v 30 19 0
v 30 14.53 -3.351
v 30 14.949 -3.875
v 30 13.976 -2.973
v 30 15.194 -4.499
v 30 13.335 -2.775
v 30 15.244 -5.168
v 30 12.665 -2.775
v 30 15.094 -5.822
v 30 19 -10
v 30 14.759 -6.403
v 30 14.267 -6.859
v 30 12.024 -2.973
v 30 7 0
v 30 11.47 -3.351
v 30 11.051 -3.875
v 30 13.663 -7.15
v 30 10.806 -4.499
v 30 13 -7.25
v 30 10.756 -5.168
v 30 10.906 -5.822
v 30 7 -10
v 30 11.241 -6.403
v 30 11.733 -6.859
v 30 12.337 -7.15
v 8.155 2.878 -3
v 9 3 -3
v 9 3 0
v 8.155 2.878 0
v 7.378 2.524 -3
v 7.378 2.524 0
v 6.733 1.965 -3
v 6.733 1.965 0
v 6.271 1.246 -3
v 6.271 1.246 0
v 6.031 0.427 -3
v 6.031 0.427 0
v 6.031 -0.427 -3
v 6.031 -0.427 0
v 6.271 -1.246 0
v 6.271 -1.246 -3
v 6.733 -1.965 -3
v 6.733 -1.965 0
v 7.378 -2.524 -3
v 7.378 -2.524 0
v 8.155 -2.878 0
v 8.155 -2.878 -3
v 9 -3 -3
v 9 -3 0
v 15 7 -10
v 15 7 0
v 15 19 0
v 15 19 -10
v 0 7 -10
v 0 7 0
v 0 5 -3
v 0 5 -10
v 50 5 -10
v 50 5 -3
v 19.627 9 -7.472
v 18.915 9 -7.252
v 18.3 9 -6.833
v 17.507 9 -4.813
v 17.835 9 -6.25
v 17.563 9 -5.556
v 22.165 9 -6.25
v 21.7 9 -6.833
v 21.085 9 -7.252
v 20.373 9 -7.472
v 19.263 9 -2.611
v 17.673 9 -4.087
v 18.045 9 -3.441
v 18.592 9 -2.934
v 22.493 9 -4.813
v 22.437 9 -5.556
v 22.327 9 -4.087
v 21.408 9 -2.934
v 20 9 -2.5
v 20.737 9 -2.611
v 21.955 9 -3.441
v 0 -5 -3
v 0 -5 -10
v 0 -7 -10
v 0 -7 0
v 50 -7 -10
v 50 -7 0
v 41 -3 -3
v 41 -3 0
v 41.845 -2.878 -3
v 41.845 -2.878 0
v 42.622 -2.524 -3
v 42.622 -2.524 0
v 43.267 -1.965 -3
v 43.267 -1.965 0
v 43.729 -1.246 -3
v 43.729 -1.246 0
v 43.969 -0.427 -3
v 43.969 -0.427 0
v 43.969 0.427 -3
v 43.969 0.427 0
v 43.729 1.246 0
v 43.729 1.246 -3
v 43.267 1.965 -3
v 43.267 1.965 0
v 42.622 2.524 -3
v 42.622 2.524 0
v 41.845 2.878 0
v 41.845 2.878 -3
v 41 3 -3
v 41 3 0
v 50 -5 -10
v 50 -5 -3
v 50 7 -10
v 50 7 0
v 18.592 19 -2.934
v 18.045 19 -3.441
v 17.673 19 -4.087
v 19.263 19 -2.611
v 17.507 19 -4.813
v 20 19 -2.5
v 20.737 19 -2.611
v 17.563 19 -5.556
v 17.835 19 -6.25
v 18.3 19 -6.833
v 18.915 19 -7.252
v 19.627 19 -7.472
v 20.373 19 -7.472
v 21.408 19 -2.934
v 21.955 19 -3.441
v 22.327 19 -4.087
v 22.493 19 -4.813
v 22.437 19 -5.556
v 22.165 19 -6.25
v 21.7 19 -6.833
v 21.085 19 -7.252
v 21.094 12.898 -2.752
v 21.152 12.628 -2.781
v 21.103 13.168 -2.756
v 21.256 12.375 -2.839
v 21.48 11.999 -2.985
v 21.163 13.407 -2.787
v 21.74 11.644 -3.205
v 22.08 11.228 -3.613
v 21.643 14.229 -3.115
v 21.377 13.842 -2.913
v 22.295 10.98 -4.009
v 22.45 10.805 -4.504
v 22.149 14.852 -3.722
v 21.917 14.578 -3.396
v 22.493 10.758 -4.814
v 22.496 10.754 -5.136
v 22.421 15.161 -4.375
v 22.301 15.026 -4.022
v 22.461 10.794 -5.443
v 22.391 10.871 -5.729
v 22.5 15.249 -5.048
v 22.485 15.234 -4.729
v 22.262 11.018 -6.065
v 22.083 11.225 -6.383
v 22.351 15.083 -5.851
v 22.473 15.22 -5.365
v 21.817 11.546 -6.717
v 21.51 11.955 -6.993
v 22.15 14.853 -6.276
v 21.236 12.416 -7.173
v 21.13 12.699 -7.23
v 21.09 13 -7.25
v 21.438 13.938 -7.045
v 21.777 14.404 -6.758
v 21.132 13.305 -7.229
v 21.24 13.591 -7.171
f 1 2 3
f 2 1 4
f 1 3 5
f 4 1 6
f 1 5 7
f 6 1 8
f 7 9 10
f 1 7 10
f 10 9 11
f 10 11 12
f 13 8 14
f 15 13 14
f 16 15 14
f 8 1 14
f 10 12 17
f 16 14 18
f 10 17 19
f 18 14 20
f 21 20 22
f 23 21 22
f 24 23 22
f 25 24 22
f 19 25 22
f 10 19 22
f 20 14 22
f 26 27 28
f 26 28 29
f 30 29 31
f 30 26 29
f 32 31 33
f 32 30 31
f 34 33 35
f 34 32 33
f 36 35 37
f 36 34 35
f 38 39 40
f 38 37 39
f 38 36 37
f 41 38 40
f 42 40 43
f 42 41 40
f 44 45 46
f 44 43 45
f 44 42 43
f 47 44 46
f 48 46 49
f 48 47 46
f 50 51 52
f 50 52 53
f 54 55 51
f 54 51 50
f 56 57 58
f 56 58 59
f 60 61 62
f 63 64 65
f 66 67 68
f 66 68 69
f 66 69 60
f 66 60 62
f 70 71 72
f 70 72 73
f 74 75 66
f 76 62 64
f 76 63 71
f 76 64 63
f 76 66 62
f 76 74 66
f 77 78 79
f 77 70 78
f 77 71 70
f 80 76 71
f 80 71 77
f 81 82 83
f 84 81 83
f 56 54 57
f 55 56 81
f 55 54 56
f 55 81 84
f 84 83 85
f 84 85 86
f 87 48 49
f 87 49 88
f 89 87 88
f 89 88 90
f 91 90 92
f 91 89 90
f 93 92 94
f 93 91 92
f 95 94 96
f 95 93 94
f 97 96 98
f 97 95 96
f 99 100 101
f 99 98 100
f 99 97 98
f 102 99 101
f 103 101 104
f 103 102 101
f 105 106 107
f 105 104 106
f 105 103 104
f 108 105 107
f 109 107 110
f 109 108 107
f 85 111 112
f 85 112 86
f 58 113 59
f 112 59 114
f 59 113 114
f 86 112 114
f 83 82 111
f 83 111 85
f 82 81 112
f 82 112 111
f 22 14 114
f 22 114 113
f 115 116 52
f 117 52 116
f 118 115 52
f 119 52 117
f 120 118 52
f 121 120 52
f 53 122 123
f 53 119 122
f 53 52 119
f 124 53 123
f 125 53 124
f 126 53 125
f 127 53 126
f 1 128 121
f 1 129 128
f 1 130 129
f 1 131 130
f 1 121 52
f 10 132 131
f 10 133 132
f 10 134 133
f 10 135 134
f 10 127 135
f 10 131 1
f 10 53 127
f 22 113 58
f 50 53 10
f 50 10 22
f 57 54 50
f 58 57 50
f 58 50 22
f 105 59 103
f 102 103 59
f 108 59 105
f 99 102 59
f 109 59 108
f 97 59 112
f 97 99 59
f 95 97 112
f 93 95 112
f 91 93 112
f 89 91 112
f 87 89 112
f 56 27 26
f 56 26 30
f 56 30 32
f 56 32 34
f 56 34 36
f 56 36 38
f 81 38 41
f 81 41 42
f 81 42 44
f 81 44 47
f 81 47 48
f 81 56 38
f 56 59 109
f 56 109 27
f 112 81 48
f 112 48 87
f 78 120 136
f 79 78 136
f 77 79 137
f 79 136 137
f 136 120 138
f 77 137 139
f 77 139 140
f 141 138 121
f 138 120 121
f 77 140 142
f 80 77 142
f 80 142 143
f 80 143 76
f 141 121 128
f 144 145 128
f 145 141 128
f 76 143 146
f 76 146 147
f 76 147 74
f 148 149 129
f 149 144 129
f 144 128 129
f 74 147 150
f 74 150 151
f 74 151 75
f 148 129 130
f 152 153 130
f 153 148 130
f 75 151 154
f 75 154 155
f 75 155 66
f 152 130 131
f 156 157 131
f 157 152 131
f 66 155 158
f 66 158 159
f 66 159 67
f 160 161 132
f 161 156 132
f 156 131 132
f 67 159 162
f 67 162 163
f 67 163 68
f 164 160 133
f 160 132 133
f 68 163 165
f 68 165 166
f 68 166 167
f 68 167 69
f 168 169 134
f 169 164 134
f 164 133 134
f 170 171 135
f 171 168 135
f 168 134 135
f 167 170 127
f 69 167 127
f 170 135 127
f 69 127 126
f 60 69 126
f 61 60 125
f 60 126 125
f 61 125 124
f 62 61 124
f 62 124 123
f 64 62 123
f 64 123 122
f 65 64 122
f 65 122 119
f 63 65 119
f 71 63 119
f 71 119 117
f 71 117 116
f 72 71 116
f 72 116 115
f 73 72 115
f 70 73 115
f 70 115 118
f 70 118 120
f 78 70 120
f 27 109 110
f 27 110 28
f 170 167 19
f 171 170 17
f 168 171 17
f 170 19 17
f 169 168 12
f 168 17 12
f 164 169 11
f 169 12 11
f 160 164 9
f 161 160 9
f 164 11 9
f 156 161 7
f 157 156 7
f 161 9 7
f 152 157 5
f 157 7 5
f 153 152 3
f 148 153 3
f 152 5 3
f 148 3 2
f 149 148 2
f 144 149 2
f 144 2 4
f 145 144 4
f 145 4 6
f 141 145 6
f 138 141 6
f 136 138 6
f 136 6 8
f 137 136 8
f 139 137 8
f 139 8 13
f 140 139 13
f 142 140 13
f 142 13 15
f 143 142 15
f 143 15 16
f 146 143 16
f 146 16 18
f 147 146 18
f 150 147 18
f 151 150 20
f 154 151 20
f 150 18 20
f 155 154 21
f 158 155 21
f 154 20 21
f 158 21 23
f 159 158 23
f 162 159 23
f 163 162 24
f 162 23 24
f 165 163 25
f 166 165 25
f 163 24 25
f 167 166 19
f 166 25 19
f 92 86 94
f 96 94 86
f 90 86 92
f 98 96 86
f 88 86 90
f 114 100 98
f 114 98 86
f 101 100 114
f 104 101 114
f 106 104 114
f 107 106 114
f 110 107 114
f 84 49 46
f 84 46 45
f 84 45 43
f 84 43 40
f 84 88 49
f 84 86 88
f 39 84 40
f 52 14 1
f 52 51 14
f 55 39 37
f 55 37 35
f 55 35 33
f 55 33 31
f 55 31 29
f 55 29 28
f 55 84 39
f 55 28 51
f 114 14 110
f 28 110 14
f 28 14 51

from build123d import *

# Parameters (mm, degrees)
BOSS_EXTRUDE1_DEPTH     = 50
CUT_EXTRUDE1_DEPTH      = 51.970579749
SKETCH4_W               = 15
SKETCH4_H               = 10
BOSS_EXTRUDE2_DEPTH     = 12
SKETCH5_R               = 2.5
CUT_EXTRUDE2_DEPTH      = 10
CUT_EXTRUDE3_REACH      = 38.892
CUT_EXTRUDE3_END_RADIUS = 2.5
SKETCH6_R               = 2.25


with BuildPart() as part:
    # Sketch2 → Boss-Extrude1 (new body)
    with BuildSketch(Plane(origin=(0, 0, 0), x_dir=(0, 0, -1), z_dir=(1, 0, 0))):
        Polygon((0, -7), (0, 7), (10, 7), (10, 5), (3, 5), (3, -5), (10, -5), (10, -7), align=None)
    extrude(amount=BOSS_EXTRUDE1_DEPTH)

    # Sketch3 → Cut-Extrude1 (cut, through all)
    with BuildSketch(Plane(origin=(0, 0, -3), x_dir=(-1, 0, 0), z_dir=(0, 0, -1))):
        with BuildLine():
            Line((-41, 3), (-9, 3))
            ThreePointArc((-9, 3), (-6, 0), (-9, -3))
            Line((-9, -3), (-41, -3))
            ThreePointArc((-41, -3), (-44, 0), (-41, 3))
        make_face()
    extrude(amount=-CUT_EXTRUDE1_DEPTH, mode=Mode.SUBTRACT)

    # Sketch4 → Boss-Extrude2 (add)
    with BuildSketch(Plane(origin=(0, 7, 0), x_dir=(1, 0, 0), z_dir=(0, 1, 0))):
        with Locations((22.5, 5)):
            Rectangle(SKETCH4_W, SKETCH4_H)
    extrude(amount=BOSS_EXTRUDE2_DEPTH)

    # Sketch5 → Cut-Extrude2 (cut)
    with BuildSketch(Plane(origin=(0, 19, 0), x_dir=(1, 0, 0), z_dir=(0, 1, 0))):
        with Locations(Location((20, 5, 0), (0, 0, 270))):
            Circle(SKETCH5_R)
    extrude(amount=-CUT_EXTRUDE2_DEPTH, mode=Mode.SUBTRACT)

    # Cut-Extrude3: up to this cylinder (the profile starts outside it)
    cut_extrude3_end = Plane(origin=(20, 13, -5), z_dir=(0, 1, 0)) * Cylinder(CUT_EXTRUDE3_END_RADIUS, 83.784, mode=Mode.PRIVATE)
    # Sketch6 → Cut-Extrude3 (cut, up to the surface)
    with BuildSketch(Plane(origin=(30, 0, 0), x_dir=(0, 0, -1), z_dir=(1, 0, 0)), mode=Mode.PRIVATE) as cut_extrude3_sk1:
        with Locations((5, 13)):
            Circle(SKETCH6_R)
    cut_extrude3_tool1 = extrude(cut_extrude3_sk1.sketch, amount=-CUT_EXTRUDE3_REACH, mode=Mode.PRIVATE) - cut_extrude3_end
    add(cut_extrude3_tool1.solids().sort_by_distance((30, 13, -5))[0], mode=Mode.SUBTRACT)


solid = part.part
